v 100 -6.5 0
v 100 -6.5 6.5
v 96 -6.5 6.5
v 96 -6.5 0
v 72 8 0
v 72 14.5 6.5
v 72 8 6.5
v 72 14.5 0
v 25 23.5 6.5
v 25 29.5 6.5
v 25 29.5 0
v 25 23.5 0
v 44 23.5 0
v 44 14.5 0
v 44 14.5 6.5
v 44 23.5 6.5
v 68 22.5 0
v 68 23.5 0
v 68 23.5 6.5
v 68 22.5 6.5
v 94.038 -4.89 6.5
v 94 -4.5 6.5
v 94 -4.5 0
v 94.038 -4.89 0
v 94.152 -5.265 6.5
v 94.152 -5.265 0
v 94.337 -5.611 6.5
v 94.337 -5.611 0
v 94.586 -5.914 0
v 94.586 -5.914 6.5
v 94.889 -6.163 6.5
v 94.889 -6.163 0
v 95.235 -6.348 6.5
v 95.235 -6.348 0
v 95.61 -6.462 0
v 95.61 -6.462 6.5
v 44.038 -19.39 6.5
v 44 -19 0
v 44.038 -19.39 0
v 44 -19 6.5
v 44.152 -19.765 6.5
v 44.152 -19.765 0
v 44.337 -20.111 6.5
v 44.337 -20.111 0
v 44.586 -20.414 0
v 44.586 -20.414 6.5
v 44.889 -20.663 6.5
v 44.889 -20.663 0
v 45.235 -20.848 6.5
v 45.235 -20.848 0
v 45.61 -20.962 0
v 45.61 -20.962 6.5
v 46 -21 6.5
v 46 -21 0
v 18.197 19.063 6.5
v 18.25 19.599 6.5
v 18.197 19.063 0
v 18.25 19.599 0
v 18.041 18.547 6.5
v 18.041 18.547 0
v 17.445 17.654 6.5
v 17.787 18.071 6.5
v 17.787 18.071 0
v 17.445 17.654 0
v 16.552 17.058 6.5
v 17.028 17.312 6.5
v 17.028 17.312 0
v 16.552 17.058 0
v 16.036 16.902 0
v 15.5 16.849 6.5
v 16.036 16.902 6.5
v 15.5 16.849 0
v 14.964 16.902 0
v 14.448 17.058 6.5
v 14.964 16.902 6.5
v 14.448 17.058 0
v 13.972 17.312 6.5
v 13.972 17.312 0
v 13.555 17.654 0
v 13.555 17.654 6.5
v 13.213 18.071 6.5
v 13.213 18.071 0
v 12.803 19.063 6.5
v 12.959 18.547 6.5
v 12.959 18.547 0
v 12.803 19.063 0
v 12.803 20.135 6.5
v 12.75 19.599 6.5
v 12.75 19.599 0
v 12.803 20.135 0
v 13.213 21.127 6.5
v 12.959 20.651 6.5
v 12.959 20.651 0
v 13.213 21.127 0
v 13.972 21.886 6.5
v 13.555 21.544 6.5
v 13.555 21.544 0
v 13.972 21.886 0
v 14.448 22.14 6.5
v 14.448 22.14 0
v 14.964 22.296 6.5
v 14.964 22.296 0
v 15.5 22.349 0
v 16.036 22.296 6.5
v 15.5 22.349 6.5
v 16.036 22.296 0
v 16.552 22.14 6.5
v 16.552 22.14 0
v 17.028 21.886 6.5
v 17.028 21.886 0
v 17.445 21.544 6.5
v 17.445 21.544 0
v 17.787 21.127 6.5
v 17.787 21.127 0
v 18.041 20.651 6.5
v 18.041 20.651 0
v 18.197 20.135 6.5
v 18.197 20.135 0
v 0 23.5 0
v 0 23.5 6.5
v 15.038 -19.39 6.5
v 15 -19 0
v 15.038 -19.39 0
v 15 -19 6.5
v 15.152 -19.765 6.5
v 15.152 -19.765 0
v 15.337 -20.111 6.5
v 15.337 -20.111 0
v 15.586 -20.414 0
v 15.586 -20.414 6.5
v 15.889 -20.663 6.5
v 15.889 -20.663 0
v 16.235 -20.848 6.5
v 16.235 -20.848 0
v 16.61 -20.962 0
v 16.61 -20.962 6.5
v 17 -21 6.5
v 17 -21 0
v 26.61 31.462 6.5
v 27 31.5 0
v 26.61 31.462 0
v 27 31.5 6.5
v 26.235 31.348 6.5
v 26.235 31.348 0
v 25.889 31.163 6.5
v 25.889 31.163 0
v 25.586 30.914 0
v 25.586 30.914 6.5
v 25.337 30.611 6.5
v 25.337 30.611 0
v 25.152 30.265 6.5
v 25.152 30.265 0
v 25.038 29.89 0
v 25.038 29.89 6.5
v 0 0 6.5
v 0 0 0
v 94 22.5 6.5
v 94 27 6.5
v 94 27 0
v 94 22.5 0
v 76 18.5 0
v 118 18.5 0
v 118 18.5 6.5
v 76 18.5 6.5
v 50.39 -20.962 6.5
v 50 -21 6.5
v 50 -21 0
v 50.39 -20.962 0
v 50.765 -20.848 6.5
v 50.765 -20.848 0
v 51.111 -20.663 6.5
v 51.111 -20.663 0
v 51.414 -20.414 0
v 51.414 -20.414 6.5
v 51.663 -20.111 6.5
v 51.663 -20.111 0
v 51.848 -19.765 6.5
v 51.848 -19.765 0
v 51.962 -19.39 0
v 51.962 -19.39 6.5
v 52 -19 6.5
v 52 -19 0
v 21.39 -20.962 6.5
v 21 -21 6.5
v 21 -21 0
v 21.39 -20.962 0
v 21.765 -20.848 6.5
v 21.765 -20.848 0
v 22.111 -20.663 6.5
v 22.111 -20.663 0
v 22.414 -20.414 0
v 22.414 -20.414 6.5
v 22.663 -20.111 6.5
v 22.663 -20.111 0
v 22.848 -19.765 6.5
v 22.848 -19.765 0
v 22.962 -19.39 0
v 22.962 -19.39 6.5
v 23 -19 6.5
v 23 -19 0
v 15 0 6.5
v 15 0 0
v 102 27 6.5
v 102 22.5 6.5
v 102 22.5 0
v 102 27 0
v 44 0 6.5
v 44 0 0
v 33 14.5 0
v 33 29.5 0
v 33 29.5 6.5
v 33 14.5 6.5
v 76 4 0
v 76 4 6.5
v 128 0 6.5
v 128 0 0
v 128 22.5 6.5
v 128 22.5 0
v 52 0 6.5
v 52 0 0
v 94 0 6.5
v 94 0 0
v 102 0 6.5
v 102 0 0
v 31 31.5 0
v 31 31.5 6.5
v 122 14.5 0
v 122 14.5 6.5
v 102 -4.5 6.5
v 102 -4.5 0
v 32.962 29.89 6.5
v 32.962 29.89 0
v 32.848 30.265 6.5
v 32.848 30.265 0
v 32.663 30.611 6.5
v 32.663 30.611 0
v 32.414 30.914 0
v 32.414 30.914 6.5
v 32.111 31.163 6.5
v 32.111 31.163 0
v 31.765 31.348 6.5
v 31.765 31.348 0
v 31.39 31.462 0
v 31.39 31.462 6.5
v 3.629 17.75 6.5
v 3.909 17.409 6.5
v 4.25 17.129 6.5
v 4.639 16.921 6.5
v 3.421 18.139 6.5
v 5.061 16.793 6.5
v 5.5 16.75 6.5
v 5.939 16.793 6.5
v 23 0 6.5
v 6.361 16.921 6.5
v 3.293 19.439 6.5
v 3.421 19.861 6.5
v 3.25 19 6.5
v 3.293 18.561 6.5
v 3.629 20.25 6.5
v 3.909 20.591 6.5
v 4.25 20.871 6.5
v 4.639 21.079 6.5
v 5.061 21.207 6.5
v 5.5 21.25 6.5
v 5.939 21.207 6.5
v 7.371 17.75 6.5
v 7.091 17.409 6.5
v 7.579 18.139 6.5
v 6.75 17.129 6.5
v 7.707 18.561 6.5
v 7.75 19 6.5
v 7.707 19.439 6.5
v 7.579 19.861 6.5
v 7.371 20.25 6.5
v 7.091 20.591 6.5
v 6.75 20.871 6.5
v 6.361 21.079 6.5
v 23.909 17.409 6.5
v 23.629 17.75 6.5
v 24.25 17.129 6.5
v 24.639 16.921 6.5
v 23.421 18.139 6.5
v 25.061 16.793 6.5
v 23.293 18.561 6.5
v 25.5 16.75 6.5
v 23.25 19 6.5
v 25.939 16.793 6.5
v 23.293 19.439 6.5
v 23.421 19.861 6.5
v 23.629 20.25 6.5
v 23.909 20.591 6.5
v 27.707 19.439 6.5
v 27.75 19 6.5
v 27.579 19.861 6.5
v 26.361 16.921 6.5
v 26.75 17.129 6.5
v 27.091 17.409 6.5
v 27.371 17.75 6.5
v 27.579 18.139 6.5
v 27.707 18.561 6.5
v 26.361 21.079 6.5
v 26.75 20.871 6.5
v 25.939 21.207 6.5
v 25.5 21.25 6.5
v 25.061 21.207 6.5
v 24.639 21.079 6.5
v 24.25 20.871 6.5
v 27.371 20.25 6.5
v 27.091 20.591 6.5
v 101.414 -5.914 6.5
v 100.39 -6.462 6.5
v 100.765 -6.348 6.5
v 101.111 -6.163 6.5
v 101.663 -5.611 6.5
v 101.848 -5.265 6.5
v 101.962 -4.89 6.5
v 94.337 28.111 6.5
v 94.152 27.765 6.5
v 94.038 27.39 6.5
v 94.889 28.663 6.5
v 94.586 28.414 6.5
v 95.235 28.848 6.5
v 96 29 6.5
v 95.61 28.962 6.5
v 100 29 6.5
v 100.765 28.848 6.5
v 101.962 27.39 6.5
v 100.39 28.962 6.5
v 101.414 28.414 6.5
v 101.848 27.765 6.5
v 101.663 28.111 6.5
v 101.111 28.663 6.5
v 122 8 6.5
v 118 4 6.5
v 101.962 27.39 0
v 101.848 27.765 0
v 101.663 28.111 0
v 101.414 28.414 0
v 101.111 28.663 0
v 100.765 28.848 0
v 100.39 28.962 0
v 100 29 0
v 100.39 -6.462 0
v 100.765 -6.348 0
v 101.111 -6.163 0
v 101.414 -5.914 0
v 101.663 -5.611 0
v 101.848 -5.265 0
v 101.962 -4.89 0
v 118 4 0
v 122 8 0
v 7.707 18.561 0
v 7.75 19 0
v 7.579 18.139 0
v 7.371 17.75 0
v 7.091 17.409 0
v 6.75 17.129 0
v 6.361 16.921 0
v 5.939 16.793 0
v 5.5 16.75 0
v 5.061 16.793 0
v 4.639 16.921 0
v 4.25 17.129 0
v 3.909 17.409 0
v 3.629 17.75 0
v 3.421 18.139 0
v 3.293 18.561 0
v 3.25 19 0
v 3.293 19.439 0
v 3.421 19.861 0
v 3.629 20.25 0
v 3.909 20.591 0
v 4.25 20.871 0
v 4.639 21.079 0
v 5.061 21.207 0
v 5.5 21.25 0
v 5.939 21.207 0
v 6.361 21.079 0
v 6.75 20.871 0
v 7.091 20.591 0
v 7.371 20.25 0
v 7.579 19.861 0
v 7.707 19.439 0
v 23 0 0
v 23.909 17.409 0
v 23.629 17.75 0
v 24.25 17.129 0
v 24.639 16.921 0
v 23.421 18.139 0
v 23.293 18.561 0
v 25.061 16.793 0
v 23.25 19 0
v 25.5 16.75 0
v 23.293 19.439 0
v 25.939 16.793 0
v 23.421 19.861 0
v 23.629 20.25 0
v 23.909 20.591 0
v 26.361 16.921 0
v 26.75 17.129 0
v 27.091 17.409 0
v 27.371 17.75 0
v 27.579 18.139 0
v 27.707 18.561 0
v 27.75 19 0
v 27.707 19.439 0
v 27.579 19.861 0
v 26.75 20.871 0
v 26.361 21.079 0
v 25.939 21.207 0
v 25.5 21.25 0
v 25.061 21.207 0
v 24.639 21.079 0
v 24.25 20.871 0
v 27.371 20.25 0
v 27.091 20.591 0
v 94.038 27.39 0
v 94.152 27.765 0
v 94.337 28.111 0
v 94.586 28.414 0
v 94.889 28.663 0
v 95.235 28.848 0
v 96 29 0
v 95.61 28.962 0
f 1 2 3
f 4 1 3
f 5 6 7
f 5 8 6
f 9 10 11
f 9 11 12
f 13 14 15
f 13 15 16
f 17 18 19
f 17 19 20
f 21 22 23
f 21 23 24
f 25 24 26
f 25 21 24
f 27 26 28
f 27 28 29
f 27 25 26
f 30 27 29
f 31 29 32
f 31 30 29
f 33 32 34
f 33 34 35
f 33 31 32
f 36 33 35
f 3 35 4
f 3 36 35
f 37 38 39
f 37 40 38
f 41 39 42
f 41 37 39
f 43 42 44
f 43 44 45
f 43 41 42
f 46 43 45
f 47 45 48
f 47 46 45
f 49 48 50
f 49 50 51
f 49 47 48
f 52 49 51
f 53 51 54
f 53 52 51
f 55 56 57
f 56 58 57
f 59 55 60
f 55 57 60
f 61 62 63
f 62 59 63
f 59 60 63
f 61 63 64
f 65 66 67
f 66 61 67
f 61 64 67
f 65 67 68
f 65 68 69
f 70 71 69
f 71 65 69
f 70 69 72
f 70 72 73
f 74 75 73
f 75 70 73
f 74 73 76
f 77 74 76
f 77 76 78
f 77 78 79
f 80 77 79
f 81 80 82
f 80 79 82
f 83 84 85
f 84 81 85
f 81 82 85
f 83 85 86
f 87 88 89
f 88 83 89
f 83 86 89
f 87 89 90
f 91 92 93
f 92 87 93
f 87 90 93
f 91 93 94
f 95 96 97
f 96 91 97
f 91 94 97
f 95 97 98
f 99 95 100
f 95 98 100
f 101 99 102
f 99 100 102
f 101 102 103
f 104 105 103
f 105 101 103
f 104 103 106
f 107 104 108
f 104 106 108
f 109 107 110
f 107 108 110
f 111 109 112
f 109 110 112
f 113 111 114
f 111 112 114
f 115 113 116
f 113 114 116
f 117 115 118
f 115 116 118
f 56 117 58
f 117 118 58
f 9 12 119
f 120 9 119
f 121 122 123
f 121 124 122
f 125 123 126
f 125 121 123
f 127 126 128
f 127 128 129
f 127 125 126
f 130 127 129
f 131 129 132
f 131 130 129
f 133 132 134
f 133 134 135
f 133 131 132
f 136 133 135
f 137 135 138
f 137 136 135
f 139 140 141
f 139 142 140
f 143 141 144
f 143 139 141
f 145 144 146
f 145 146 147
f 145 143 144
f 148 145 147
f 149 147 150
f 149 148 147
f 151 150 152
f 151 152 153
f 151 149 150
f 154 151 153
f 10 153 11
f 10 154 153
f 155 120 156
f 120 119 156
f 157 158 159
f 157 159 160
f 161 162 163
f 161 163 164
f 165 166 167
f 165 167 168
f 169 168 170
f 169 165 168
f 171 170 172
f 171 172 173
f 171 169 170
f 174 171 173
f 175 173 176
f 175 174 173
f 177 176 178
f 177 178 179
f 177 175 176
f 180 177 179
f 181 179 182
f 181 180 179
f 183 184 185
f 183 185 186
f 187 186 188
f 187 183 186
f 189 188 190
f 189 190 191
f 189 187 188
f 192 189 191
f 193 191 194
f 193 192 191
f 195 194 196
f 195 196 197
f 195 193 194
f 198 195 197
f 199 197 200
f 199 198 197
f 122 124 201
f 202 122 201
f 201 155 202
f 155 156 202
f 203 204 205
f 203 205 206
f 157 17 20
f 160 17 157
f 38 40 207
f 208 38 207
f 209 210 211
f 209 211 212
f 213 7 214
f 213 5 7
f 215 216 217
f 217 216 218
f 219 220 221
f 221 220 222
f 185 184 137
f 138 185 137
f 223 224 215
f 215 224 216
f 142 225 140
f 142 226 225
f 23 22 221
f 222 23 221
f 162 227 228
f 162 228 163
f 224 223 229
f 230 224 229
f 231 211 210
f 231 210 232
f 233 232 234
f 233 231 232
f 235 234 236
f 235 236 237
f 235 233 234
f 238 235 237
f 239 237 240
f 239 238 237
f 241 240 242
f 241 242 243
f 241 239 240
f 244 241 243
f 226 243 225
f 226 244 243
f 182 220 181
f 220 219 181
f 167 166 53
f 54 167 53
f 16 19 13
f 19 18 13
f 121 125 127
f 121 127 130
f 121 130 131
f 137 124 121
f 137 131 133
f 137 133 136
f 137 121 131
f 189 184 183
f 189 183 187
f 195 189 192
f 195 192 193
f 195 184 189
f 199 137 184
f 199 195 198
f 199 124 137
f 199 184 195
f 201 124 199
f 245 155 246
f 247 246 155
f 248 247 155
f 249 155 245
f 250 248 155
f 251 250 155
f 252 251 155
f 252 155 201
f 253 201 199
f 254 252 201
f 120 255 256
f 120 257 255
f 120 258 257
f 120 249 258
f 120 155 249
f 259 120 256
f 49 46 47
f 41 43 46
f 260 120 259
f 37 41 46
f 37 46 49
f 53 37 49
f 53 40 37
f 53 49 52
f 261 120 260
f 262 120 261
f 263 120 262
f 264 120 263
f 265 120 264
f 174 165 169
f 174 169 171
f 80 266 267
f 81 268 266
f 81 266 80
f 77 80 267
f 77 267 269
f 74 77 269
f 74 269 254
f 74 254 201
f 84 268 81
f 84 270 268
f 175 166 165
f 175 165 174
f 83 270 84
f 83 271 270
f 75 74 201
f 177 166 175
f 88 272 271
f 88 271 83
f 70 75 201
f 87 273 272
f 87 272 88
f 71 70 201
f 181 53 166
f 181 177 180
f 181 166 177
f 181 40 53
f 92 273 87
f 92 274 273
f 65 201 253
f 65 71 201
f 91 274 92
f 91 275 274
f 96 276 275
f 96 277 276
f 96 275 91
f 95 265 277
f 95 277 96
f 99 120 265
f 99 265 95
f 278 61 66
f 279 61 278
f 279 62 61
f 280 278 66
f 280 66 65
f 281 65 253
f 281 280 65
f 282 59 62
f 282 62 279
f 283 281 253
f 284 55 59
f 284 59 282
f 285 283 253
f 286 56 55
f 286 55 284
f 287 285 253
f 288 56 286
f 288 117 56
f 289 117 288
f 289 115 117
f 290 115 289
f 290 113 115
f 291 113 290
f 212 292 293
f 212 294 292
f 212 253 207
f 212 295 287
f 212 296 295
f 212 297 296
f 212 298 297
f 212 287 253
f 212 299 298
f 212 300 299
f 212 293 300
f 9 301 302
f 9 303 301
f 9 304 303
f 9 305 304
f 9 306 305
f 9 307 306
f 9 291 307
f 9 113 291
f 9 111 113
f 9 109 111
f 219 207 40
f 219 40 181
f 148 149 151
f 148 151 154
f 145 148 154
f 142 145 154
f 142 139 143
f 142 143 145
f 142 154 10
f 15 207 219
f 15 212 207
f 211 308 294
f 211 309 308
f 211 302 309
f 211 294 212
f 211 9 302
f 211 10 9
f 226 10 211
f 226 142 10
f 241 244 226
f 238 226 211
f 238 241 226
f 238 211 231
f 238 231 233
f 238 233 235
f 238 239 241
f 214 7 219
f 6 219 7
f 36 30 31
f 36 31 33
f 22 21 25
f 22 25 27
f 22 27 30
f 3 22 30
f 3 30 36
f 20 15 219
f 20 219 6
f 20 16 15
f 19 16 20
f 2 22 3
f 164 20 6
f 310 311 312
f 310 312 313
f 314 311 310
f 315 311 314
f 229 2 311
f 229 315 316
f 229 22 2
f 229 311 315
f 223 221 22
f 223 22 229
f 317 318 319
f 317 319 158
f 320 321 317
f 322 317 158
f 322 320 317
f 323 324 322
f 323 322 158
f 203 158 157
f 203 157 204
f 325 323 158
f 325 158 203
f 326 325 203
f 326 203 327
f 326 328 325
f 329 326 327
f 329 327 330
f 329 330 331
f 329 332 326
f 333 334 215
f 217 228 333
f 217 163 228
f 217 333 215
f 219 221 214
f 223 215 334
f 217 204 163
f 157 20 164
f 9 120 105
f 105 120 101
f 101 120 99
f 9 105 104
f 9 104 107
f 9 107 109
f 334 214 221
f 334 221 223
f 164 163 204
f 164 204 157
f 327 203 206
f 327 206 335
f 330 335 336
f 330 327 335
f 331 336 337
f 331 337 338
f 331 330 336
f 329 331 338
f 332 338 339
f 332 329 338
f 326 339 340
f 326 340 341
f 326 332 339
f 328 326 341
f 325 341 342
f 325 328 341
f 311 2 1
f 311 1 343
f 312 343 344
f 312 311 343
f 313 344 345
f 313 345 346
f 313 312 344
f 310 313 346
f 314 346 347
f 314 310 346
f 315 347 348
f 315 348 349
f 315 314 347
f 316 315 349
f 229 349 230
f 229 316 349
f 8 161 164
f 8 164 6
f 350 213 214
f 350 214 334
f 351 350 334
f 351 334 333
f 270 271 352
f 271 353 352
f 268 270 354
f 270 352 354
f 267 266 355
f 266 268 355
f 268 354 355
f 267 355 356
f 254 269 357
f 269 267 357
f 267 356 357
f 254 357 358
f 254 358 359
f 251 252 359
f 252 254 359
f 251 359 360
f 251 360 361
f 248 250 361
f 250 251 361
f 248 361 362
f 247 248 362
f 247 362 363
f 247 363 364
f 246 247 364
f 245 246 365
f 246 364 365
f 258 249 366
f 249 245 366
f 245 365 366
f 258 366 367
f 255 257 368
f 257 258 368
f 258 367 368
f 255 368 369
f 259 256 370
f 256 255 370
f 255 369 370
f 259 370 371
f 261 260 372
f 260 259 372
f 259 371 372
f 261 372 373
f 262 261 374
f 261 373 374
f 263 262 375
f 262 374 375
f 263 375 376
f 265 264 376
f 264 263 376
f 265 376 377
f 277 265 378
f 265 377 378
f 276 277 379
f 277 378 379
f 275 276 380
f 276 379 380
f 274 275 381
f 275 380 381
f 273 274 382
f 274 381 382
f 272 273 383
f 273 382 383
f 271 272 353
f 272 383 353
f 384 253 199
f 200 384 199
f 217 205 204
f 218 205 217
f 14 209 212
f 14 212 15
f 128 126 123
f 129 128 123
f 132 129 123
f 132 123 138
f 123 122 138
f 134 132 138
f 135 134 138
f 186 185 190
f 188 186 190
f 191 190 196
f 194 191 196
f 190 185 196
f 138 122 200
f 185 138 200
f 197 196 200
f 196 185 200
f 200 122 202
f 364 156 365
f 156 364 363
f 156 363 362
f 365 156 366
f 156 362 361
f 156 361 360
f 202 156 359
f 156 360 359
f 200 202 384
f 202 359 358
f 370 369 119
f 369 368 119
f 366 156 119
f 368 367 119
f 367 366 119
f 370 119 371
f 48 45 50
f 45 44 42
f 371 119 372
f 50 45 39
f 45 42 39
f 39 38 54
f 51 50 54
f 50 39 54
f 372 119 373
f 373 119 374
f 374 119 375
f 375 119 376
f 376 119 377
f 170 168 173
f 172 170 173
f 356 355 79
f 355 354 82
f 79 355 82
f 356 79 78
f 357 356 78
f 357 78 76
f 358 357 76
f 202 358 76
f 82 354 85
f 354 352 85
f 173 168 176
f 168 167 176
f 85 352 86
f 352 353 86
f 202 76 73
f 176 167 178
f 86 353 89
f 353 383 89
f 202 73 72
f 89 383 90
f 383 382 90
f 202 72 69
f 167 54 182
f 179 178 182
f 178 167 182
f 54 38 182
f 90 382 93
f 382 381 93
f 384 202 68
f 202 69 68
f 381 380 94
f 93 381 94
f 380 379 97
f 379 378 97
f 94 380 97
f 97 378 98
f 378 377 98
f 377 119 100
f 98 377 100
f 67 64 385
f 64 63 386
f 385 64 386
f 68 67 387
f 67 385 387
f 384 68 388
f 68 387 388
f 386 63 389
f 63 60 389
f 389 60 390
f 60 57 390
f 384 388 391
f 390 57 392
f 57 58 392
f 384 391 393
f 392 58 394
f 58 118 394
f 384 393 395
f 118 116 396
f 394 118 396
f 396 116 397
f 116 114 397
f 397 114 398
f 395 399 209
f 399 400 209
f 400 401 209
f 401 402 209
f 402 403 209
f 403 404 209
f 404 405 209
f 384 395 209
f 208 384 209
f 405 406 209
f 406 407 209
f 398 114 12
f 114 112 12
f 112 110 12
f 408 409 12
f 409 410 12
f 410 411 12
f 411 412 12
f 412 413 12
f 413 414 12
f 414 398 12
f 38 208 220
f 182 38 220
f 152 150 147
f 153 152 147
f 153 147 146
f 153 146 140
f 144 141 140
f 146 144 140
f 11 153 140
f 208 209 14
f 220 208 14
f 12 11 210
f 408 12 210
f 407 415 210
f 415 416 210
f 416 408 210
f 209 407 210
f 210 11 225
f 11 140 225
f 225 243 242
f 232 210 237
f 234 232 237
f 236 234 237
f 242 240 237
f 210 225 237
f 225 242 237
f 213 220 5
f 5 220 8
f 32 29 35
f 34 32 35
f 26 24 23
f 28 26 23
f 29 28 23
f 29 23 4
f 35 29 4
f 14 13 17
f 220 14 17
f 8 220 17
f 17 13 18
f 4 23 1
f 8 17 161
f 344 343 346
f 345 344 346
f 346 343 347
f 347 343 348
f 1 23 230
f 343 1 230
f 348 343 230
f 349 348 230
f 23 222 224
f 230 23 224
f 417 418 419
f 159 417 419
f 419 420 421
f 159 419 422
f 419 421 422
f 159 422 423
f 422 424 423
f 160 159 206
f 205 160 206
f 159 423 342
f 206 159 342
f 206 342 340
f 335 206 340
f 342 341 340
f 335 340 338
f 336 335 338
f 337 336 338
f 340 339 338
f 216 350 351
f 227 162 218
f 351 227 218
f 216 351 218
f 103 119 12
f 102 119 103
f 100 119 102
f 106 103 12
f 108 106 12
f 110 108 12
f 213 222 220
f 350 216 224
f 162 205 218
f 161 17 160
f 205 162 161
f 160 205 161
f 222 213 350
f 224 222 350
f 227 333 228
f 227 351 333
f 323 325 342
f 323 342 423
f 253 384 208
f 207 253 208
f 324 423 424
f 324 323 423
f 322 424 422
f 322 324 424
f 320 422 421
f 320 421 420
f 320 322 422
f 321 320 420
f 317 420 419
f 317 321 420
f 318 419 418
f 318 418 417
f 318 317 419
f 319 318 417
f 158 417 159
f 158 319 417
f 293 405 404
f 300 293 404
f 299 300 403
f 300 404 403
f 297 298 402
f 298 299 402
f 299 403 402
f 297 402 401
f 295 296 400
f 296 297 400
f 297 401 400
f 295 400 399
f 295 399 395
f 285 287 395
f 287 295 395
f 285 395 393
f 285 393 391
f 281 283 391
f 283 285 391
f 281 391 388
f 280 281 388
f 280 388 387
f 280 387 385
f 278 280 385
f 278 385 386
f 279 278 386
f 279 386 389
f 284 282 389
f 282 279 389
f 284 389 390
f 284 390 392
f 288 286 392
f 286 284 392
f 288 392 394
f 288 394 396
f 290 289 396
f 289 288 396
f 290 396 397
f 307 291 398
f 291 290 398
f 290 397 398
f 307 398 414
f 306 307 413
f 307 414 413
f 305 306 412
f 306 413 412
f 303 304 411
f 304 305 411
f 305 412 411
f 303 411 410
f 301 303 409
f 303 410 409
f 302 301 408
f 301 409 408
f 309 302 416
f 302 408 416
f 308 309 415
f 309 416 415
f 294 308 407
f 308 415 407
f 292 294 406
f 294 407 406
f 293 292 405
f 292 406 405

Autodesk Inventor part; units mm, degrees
ref_plane "YZ Plane" through (0, 0, 0) normal (1, 0, 0) x (0, 1, 0)
ref_plane "XZ Plane" through (0, 0, 0) normal (0, 1, 0) x (-1, 0, 0)
ref_plane "XY Plane" through (0, 0, 0) normal (0, 0, 1) x (1, 0, 0)
sketch "Sketch1" plane through (0, 0, 0) normal (0, 0, 1) x (1, 0, 0)
  line L0 (0, 0) -> (128, 0)
  line L1 (128, 0) -> (128, 22.5)
  line L2 (0, 23.5) -> (0, 0)
  line L3 (68, 23.5) -> (68, 22.5)
  line L4 (68, 22.5) -> (128, 22.5)
  line L5 (33, 23.5) -> (33, 14.5)
  line L6 (33, 14.5) -> (44, 14.5)
  line L7 (44, 14.5) -> (44, 23.5)
  line L8 (68, 23.5) -> (44, 23.5)
  line L9 (33, 23.5) -> (0, 23.5)
  line L10 (72, 14.5) -> (72, 8)
  line L11 (72, 8) -> (76, 4)
  line L12 (76, 4) -> (118, 4)
  line L13 (118, 4) -> (122, 8)
  line L14 (122, 8) -> (122, 14.5)
  line L15 (122, 14.5) -> (118, 18.5)
  line L16 (118, 18.5) -> (76, 18.5)
  line L17 (76, 18.5) -> (72, 14.5)
  line L18 (68, 22.5) -> (68, 0) construction
  circle A0 centre (5.5, 19) radius 2.25
  circle A1 centre (25.5, 19) radius 2.25
  circle A2 centre (15.5, 19.599) radius 2.75
  circle A3 centre (38.5, 19.599) radius 7.5 construction
  circle A4 centre (38.5, 19.599) radius 4 construction
  point P0 (33, 19)
  dimension "d0" = 128
  dimension "d1" = 23.5
  dimension "d2" = 22.5
  dimension "d3" = 60
  dimension "d4" = 11
  dimension "d5" = 9
  dimension "d6" = 33
  dimension "d7" = 45
  dimension "d8" = 4
  dimension "d9" = 4
  dimension "d10" = 6
  dimension "d11" = 4
  dimension "d12" = 4
  dimension "d13" = 4.5
  dimension "d14" = 4.5
  dimension "d15" = 5.5
  dimension "d16" = 20
  dimension "d17" = 5.5
  dimension "d18" = 8
  dimension "d19" = 15
  dimension "d20" = 10
extrude "Extrusion1" add sketch "Sketch1" along normal blind 6.5
sketch "Sketch2" plane through (0, 0, 6.5) normal (0, 0, 1) x (1, 0, 0)
  line L0 (0, 0) -> (128, 0) projected
  line L1 (128, 0) -> (128, 22.5) projected
  line L2 (128, 22.5) -> (68, 22.5) projected
  line L3 (33, 23.5) -> (0, 23.5) projected
  line L4 (0, 23.5) -> (0, 0) projected
  line L5 (25, 23.5) -> (33, 23.5)
  line L6 (33, 23.5) -> (33, 29.5)
  line L7 (31, 31.5) -> (27, 31.5)
  line L8 (25, 29.5) -> (25, 23.5)
  line L9 (94, 22.5) -> (102, 22.5)
  line L10 (102, 22.5) -> (102, 27)
  line L11 (100, 29) -> (96, 29)
  line L12 (94, 27) -> (94, 22.5)
  line L13 (15, 0) -> (23, 0)
  line L14 (23, 0) -> (23, -19)
  line L15 (21, -21) -> (17, -21)
  line L16 (15, -19) -> (15, 0)
  line L17 (44, 0) -> (52, 0)
  line L18 (52, 0) -> (52, -19)
  line L19 (50, -21) -> (46, -21)
  line L20 (44, -19) -> (44, 0)
  line L21 (94, 0) -> (102, 0)
  line L22 (102, 0) -> (102, -4.5)
  line L23 (100, -6.5) -> (96, -6.5)
  line L24 (94, -4.5) -> (94, 0)
  arc A0 (27, 31.5) -> (25, 29.5) centre (27, 29.5) ccw
  arc A1 (33, 29.5) -> (31, 31.5) centre (31, 29.5) ccw
  arc A2 (96, 29) -> (94, 27) centre (96, 27) ccw
  arc A3 (102, 27) -> (100, 29) centre (100, 27) ccw
  arc A4 (15, -19) -> (17, -21) centre (17, -19) ccw
  arc A5 (21, -21) -> (23, -19) centre (21, -19) ccw
  arc A6 (44, -19) -> (46, -21) centre (46, -19) ccw
  arc A7 (50, -21) -> (52, -19) centre (50, -19) ccw
  arc A8 (94, -4.5) -> (96, -6.5) centre (96, -4.5) ccw
  arc A9 (100, -6.5) -> (102, -4.5) centre (100, -4.5) ccw
  line L25 (33, 14.5) -> (33, 23.5) projected
  dimension "d23" = 2
  dimension "d24" = 8
  dimension "d25" = 8
  dimension "d26" = 8
  dimension "d27" = 8
  dimension "d28" = 8
  dimension "d29" = 21
  dimension "d30" = 8
  dimension "d31" = 6.5
  dimension "d33" = 26
  dimension "d34" = 15
  dimension "d35" = 21
  dimension "d38" = 6.5
extrude "Extrusion2" add sketch "Sketch2" against normal blind 6.5
properties part number "x_iddler_upper_nut_stop" material "Plywood, Finish"
